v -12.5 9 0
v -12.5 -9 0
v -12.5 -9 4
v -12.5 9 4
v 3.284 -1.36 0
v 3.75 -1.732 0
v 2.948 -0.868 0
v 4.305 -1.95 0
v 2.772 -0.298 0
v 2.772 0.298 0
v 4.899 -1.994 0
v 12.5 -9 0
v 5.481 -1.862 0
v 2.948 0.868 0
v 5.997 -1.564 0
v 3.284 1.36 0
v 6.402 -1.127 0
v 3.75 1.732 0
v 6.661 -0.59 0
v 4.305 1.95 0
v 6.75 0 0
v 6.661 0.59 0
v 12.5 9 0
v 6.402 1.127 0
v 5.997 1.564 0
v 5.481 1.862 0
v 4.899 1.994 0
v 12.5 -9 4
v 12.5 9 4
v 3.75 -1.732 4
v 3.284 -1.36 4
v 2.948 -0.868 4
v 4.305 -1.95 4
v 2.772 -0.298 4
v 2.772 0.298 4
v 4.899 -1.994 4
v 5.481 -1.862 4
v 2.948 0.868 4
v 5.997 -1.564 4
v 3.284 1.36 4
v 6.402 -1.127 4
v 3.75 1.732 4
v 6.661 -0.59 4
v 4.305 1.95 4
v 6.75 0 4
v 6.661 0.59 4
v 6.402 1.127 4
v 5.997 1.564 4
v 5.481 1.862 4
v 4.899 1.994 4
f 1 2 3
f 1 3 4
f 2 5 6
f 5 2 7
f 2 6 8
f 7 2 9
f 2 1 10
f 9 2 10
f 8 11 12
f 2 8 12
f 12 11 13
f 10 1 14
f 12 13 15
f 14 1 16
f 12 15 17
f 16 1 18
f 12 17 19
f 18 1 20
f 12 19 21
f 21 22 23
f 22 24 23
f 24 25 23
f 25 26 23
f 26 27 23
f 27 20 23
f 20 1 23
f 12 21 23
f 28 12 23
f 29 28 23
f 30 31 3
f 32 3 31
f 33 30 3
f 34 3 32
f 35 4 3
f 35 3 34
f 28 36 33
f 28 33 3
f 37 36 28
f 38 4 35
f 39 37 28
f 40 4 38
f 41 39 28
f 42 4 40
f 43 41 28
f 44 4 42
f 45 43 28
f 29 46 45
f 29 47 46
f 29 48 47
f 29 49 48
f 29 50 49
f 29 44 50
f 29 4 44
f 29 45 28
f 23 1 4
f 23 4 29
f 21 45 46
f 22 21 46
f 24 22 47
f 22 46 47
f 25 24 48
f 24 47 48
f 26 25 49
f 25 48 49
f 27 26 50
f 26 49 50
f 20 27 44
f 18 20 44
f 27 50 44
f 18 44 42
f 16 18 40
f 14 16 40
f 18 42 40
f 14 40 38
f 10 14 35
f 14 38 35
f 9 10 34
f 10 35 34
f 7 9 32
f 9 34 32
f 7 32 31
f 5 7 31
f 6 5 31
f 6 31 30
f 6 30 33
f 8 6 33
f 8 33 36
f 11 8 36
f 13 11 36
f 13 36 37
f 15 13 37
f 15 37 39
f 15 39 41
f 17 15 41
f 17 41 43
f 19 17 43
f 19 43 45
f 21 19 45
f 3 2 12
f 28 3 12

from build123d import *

# Parameters (mm, degrees)
SZKIC1_W                    = 25
SZKIC1_H                    = 18
DODANIE_WYCI_GNI_CIE1_DEPTH = 4
WYTNIJ_WYCI_GNI_CIE1_REACH  = 17.914
SZKIC2_R                    = 2


with BuildPart() as part:
    # Szkic1 → Dodanie-wyciągnięcie1 (new body)
    with BuildSketch(Plane.XY):
        Rectangle(SZKIC1_W, SZKIC1_H)
    extrude(amount=DODANIE_WYCI_GNI_CIE1_DEPTH)

    # Szkic2 → Wytnij-wyciągnięcie1 (cut, up to next)
    with BuildSketch(Plane.XY.offset(4), mode=Mode.PRIVATE) as wytnij_wyci_gni_cie1_sk1:
        with Locations((4.75, 0)):
            Circle(SZKIC2_R)
    wytnij_wyci_gni_cie1_tool1 = extrude(wytnij_wyci_gni_cie1_sk1.sketch, amount=-WYTNIJ_WYCI_GNI_CIE1_REACH, mode=Mode.PRIVATE) & part.part
    add(wytnij_wyci_gni_cie1_tool1.solids().sort_by_distance((4.75, 0, 4))[0], mode=Mode.SUBTRACT)


solid = part.part
